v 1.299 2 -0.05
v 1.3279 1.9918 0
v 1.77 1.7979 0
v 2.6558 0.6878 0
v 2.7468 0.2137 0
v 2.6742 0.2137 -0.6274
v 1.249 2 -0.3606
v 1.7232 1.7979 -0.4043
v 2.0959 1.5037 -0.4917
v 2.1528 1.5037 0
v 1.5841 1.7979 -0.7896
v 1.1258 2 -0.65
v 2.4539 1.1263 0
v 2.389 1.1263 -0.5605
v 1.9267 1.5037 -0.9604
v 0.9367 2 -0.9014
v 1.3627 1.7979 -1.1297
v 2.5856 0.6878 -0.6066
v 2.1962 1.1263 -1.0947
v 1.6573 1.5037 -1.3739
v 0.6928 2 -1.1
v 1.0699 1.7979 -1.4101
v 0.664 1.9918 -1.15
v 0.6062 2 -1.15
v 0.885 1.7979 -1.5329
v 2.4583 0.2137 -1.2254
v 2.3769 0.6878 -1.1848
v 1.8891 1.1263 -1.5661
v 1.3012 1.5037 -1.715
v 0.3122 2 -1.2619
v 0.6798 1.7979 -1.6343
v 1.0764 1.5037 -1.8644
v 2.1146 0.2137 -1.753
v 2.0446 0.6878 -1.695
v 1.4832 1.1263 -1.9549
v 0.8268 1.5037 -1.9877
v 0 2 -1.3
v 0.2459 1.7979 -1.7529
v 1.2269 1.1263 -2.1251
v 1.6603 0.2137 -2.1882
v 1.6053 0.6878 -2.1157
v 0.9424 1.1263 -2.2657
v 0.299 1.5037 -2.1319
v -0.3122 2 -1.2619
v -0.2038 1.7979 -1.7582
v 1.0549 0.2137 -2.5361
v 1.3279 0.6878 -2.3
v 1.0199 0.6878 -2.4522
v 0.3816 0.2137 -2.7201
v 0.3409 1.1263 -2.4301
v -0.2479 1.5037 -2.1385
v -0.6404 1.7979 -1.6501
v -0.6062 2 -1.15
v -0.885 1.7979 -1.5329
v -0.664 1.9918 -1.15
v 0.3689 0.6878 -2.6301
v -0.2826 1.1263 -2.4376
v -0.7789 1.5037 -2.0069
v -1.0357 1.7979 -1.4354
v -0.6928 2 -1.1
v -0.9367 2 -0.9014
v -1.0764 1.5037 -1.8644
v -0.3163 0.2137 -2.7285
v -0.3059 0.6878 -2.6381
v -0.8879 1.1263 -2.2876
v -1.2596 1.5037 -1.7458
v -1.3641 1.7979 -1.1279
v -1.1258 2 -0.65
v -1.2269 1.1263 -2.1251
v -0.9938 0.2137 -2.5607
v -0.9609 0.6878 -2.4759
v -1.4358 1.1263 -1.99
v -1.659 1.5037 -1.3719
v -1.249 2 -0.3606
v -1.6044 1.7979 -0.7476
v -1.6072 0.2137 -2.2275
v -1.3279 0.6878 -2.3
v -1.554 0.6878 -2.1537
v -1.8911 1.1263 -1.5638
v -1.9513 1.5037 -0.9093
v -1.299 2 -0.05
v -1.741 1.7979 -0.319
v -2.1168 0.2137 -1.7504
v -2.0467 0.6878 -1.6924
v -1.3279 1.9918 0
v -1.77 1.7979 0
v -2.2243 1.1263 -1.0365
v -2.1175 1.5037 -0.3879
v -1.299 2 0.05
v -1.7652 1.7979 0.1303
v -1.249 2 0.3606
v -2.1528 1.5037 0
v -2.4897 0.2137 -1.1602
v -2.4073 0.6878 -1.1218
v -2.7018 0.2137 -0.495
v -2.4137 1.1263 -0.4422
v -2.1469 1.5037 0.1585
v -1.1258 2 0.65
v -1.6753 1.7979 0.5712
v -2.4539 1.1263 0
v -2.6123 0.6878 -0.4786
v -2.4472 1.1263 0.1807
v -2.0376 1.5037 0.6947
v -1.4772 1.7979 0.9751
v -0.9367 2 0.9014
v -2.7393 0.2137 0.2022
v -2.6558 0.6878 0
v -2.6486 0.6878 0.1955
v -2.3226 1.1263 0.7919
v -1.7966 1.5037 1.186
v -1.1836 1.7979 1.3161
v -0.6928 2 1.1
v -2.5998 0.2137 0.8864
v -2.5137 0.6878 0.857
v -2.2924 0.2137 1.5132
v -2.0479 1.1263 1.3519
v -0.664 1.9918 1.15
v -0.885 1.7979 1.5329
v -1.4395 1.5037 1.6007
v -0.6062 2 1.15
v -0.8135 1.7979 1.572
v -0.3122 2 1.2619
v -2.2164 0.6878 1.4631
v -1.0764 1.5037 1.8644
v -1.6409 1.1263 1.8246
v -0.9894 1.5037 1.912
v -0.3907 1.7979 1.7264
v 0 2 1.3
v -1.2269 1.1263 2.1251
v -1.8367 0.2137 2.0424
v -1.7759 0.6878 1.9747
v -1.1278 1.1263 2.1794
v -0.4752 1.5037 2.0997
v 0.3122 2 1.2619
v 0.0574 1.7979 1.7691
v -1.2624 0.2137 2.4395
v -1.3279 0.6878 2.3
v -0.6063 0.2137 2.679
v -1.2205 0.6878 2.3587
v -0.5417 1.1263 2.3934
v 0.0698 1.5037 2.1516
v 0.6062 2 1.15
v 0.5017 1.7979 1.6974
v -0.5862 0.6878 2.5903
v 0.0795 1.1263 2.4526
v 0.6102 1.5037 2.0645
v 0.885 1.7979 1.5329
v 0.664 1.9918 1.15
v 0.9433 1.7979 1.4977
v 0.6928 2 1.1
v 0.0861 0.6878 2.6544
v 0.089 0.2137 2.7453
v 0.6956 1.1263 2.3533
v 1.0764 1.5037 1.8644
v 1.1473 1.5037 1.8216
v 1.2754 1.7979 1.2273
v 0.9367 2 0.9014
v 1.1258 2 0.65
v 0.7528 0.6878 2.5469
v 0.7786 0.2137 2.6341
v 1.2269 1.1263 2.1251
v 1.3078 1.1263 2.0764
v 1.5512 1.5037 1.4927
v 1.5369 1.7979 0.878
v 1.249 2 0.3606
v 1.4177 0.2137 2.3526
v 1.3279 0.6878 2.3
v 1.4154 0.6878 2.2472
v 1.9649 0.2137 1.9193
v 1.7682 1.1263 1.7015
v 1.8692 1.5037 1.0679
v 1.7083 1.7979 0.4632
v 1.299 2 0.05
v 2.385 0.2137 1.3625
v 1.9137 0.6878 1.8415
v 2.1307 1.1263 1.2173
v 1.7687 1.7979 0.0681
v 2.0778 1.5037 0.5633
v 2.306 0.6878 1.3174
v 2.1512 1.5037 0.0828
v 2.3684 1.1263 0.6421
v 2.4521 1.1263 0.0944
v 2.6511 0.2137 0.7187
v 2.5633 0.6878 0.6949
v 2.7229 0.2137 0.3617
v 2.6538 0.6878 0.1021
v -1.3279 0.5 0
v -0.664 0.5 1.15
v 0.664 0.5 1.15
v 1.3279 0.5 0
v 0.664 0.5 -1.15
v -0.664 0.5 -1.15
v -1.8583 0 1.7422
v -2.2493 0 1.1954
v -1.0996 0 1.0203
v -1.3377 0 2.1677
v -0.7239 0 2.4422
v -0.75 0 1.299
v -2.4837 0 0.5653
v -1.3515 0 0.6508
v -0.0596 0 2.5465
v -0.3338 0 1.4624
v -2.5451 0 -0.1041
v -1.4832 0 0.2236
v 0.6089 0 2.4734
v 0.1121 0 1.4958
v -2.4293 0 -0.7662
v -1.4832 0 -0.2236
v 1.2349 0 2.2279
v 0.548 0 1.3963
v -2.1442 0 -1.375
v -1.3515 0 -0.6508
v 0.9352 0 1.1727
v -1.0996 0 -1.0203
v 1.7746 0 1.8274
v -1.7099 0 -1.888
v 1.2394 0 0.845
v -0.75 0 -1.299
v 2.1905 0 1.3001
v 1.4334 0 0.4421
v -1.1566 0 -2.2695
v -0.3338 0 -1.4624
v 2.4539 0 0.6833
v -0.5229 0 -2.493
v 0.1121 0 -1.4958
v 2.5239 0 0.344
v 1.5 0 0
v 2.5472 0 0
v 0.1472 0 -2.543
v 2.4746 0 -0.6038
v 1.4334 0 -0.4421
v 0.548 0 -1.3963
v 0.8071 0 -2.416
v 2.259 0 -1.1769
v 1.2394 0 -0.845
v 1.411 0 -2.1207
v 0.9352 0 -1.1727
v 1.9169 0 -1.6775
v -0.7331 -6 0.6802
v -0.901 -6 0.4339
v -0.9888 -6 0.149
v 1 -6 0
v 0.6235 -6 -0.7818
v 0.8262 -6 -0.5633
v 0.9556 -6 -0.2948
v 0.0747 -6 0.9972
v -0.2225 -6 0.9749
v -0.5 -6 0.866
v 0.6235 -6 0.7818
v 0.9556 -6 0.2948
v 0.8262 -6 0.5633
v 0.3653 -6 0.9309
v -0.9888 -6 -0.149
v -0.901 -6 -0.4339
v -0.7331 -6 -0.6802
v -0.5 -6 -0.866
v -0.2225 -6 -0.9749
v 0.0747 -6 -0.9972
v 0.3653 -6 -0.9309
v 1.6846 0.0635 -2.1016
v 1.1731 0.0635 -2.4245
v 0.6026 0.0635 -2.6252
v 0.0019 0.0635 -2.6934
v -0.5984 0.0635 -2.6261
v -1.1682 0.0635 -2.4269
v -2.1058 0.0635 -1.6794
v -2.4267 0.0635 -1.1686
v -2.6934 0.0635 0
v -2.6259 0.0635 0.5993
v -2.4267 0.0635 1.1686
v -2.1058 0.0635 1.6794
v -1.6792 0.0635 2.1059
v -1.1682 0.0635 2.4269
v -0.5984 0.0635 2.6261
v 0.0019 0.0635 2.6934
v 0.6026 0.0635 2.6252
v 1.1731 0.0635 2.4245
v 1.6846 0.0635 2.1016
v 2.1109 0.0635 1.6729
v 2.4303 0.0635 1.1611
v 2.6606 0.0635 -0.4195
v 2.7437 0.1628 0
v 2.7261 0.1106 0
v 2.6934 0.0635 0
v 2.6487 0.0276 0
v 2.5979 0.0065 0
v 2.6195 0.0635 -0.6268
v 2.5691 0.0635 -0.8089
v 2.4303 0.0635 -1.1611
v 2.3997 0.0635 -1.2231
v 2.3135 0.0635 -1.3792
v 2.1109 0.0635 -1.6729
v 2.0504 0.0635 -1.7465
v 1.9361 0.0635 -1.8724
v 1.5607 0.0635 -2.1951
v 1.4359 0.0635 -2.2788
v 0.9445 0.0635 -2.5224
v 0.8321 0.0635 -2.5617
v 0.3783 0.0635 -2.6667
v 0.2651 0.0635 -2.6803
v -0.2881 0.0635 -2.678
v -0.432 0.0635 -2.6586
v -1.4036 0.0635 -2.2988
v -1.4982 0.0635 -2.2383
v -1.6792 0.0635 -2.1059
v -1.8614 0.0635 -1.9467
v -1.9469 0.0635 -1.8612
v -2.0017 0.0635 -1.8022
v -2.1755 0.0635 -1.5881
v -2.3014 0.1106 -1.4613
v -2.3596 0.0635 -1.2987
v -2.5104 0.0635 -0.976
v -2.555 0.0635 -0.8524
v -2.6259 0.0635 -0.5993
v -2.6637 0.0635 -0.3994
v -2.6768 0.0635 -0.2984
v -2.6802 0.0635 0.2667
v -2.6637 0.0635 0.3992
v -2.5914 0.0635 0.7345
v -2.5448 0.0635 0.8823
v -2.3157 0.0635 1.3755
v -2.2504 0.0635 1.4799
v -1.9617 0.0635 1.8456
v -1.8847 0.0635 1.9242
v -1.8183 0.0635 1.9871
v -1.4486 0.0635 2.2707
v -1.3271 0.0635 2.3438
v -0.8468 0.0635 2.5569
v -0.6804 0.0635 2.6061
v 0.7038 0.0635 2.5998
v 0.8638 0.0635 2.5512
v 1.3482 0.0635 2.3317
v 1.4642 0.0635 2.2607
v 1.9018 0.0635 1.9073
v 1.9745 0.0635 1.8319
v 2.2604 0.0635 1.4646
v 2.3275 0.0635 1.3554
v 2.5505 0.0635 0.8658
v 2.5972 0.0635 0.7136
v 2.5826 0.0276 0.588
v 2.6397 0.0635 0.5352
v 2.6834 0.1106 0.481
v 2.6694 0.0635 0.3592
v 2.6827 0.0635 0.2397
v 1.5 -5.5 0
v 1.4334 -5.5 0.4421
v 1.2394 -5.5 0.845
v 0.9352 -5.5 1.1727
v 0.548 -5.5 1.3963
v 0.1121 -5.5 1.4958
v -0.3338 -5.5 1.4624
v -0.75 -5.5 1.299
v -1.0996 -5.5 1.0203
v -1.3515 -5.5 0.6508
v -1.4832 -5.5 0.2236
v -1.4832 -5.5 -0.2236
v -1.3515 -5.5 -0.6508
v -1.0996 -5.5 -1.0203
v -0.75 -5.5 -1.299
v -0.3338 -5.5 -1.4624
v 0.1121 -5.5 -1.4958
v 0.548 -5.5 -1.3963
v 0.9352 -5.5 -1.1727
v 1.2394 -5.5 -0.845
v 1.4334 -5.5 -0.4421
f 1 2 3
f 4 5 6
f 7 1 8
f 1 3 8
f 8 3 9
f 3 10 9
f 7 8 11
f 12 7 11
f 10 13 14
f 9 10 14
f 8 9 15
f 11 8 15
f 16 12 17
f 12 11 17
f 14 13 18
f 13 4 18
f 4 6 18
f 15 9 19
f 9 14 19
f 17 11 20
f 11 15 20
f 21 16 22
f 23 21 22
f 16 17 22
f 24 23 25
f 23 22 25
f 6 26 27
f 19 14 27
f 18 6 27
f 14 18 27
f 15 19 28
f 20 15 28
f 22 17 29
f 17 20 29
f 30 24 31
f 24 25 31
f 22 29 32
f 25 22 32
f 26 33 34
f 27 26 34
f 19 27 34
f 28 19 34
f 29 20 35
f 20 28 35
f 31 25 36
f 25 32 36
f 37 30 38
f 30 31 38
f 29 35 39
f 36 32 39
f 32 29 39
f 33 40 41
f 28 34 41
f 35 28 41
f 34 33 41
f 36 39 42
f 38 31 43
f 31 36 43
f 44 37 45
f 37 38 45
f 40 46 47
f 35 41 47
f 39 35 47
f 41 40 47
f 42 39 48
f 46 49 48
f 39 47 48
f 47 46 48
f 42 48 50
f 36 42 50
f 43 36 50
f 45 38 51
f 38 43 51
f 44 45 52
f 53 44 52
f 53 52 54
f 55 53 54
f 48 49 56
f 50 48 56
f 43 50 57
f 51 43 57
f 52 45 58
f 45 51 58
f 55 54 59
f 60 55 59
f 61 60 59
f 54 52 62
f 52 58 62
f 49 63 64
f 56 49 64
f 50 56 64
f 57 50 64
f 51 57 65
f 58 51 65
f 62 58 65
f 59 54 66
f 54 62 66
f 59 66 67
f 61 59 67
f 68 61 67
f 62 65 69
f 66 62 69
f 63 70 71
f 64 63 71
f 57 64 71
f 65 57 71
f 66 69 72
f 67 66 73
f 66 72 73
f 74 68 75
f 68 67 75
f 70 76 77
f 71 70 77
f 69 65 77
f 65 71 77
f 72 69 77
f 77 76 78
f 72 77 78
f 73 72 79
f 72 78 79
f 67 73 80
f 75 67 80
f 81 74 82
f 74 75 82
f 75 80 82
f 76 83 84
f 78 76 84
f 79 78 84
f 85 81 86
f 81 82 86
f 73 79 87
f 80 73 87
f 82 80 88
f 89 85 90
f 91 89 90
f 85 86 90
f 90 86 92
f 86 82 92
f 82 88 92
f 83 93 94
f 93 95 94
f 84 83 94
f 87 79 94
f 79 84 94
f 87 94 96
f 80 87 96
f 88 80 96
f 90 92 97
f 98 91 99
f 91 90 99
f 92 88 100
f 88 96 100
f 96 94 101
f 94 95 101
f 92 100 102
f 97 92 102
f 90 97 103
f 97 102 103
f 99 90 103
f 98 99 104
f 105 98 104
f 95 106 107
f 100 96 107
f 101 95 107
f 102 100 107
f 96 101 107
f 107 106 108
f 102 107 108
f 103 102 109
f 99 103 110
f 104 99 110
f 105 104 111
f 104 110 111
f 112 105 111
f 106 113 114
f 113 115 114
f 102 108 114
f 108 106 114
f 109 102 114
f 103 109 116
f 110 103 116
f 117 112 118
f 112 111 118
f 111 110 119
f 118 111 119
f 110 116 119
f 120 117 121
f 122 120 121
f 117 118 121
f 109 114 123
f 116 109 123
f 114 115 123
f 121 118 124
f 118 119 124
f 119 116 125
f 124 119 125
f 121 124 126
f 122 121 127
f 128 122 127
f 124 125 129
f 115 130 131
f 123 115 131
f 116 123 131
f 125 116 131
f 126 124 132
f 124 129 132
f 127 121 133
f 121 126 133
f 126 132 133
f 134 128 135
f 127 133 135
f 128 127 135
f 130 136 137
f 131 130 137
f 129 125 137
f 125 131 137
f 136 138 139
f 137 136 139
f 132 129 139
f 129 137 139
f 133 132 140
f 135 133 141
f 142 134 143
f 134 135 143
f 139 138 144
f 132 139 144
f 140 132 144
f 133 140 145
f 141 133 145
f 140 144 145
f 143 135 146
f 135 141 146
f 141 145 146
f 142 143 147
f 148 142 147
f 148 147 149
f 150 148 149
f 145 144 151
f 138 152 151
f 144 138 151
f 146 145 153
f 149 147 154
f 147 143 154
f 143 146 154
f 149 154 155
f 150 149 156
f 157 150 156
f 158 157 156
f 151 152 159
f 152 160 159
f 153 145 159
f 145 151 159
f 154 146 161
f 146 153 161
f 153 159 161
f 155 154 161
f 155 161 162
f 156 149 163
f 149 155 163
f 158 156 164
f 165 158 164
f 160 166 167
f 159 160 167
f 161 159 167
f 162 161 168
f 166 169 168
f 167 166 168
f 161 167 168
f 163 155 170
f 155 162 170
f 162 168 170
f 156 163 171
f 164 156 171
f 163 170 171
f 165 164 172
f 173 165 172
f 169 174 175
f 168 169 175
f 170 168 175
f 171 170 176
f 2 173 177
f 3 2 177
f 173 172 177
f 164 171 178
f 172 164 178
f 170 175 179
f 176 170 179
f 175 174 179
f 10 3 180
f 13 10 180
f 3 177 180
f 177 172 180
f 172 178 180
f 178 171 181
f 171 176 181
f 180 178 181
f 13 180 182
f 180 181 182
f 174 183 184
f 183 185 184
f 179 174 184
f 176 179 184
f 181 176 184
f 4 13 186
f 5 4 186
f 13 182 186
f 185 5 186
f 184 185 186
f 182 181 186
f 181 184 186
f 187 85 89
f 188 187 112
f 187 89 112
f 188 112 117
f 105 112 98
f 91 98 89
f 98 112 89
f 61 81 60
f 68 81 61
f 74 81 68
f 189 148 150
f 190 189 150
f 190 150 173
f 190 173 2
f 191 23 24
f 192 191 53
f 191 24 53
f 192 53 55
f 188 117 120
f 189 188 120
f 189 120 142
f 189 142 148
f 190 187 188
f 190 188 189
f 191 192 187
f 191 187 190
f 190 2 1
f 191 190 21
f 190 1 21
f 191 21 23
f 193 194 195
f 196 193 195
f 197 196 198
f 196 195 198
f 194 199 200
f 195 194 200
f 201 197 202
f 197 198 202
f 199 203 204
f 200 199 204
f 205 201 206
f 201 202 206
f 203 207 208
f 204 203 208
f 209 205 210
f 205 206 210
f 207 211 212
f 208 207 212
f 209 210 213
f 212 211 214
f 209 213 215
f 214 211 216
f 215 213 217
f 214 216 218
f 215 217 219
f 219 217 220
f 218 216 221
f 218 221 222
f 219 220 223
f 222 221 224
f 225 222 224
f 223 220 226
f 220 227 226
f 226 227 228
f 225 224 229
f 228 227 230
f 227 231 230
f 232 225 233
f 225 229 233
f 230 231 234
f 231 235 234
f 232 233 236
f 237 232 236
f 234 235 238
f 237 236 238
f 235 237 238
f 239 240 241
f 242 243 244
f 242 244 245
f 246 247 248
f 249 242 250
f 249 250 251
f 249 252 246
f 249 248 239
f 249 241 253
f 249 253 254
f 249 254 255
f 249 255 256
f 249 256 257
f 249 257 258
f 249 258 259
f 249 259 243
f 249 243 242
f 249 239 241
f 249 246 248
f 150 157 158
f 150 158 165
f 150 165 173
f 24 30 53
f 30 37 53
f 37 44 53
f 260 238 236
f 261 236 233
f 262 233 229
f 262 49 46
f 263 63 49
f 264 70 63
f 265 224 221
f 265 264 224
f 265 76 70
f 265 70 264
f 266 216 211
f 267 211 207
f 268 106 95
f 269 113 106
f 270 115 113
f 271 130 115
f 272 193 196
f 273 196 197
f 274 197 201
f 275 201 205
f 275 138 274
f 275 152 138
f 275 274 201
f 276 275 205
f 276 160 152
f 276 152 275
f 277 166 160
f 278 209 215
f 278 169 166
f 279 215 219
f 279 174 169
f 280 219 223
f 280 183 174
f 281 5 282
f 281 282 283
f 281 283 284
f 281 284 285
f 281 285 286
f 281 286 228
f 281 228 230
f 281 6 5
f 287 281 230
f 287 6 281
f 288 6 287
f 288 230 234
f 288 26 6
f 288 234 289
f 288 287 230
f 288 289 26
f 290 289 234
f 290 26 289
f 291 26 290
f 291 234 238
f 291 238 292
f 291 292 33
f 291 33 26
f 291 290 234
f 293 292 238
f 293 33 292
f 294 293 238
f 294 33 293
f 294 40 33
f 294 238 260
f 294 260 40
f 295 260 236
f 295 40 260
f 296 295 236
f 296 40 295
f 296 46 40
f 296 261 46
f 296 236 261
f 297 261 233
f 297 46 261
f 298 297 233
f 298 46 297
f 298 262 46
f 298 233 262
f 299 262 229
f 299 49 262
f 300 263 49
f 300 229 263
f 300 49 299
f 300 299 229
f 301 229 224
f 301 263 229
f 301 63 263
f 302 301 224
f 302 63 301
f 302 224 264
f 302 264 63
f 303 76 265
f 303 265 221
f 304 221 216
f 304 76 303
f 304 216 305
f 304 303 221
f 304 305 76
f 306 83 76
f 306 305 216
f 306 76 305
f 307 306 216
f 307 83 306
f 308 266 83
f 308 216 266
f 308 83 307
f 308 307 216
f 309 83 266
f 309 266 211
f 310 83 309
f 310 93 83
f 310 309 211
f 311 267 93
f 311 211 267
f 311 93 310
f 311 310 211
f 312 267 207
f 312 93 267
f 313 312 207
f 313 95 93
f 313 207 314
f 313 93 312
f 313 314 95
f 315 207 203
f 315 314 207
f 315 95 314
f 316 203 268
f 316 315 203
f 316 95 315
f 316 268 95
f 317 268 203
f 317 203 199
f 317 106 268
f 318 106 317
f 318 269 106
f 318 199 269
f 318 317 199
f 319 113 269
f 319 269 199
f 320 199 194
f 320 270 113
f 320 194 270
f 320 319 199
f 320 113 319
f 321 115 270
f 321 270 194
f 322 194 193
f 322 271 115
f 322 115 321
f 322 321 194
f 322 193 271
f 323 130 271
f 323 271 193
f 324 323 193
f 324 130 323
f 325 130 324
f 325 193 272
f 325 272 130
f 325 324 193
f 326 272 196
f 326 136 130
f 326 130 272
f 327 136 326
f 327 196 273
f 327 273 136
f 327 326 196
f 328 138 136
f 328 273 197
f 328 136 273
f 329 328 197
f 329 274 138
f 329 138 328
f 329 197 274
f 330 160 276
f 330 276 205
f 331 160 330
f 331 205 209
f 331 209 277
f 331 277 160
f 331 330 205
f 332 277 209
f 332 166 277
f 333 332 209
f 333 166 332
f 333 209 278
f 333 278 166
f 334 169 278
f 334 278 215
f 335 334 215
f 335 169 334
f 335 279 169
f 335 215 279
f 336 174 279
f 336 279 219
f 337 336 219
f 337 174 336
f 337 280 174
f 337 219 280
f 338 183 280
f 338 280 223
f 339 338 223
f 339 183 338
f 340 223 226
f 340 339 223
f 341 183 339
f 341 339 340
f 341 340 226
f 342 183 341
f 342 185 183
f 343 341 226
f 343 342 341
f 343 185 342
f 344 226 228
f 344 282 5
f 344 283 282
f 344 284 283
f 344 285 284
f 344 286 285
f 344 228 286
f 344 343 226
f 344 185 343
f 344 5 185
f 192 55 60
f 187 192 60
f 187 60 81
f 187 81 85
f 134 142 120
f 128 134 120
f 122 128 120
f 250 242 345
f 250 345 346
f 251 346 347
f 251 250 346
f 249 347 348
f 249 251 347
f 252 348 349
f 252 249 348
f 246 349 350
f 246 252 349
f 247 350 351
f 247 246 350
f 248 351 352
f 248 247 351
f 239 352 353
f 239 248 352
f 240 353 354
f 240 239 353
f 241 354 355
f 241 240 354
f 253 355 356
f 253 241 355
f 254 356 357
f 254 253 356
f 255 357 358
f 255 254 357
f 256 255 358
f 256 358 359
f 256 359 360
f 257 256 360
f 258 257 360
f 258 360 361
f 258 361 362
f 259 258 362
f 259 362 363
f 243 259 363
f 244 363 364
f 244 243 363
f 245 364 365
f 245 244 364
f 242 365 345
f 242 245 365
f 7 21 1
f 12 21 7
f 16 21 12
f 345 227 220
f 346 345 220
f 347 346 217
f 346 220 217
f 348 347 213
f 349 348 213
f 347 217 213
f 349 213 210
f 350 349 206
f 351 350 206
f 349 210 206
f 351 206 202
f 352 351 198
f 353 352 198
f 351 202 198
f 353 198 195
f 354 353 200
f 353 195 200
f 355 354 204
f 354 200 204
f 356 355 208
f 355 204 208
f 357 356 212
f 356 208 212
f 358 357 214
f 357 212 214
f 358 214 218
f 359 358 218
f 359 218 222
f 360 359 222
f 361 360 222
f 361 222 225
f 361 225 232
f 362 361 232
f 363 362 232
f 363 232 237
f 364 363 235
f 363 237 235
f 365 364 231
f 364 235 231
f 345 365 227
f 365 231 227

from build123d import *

# Parameters (mm, degrees)
FILLET_1_R          = 0.2
CUT_EXTRUDE_1_DEPTH = 1.5
SKETCH_3_R          = 1.5
EXTRUDE_1_DEPTH     = 6
CHAMFER_1_SIZE      = 0.5


with BuildPart() as part:
    # 草图1 → 旋转1 (revolve)
    with BuildSketch(Plane.XY):
        with BuildLine():
            Line((0, 0), (0, 2))
            Line((0, 2), (1.3, 2))
            ThreePointArc((1.3, 2), (2.370691821, 1.250626571), (2.75, 0))
            Line((2.75, 0), (0, 0))
        make_face()
    revolve(axis=Axis((0, 0, 0), (0, 1, 0)))

    # 圆角1
    fillet_1_edges = [part.edges().sort_by_distance(p)[0] for p in [
        (-2.75, 0, 0),
    ]]
    fillet(fillet_1_edges, radius=FILLET_1_R)

    # 草图2 → 切除-拉伸1 (cut)
    with BuildSketch(Plane(origin=(0, 2, 0), x_dir=(1, 0, 0), z_dir=(0, 1, 0))):
        Polygon((1.327905619, 0), (0.66395281, 1.15), (-0.66395281, 1.15), (-1.327905619, 0), (-0.66395281, -1.15), (0.66395281, -1.15), align=None)
    extrude(amount=-CUT_EXTRUDE_1_DEPTH, mode=Mode.SUBTRACT)

    # 草图3 → 凸台-拉伸1 (add)
    with BuildSketch(Plane.XZ):
        Circle(SKETCH_3_R)
    extrude(amount=EXTRUDE_1_DEPTH)

    # 倒角1
    chamfer_1_edges = [part.edges().sort_by_distance(p)[0] for p in [
        (-1.5, -6, 0),
    ]]
    chamfer(chamfer_1_edges, length=CHAMFER_1_SIZE)


solid = part.part
